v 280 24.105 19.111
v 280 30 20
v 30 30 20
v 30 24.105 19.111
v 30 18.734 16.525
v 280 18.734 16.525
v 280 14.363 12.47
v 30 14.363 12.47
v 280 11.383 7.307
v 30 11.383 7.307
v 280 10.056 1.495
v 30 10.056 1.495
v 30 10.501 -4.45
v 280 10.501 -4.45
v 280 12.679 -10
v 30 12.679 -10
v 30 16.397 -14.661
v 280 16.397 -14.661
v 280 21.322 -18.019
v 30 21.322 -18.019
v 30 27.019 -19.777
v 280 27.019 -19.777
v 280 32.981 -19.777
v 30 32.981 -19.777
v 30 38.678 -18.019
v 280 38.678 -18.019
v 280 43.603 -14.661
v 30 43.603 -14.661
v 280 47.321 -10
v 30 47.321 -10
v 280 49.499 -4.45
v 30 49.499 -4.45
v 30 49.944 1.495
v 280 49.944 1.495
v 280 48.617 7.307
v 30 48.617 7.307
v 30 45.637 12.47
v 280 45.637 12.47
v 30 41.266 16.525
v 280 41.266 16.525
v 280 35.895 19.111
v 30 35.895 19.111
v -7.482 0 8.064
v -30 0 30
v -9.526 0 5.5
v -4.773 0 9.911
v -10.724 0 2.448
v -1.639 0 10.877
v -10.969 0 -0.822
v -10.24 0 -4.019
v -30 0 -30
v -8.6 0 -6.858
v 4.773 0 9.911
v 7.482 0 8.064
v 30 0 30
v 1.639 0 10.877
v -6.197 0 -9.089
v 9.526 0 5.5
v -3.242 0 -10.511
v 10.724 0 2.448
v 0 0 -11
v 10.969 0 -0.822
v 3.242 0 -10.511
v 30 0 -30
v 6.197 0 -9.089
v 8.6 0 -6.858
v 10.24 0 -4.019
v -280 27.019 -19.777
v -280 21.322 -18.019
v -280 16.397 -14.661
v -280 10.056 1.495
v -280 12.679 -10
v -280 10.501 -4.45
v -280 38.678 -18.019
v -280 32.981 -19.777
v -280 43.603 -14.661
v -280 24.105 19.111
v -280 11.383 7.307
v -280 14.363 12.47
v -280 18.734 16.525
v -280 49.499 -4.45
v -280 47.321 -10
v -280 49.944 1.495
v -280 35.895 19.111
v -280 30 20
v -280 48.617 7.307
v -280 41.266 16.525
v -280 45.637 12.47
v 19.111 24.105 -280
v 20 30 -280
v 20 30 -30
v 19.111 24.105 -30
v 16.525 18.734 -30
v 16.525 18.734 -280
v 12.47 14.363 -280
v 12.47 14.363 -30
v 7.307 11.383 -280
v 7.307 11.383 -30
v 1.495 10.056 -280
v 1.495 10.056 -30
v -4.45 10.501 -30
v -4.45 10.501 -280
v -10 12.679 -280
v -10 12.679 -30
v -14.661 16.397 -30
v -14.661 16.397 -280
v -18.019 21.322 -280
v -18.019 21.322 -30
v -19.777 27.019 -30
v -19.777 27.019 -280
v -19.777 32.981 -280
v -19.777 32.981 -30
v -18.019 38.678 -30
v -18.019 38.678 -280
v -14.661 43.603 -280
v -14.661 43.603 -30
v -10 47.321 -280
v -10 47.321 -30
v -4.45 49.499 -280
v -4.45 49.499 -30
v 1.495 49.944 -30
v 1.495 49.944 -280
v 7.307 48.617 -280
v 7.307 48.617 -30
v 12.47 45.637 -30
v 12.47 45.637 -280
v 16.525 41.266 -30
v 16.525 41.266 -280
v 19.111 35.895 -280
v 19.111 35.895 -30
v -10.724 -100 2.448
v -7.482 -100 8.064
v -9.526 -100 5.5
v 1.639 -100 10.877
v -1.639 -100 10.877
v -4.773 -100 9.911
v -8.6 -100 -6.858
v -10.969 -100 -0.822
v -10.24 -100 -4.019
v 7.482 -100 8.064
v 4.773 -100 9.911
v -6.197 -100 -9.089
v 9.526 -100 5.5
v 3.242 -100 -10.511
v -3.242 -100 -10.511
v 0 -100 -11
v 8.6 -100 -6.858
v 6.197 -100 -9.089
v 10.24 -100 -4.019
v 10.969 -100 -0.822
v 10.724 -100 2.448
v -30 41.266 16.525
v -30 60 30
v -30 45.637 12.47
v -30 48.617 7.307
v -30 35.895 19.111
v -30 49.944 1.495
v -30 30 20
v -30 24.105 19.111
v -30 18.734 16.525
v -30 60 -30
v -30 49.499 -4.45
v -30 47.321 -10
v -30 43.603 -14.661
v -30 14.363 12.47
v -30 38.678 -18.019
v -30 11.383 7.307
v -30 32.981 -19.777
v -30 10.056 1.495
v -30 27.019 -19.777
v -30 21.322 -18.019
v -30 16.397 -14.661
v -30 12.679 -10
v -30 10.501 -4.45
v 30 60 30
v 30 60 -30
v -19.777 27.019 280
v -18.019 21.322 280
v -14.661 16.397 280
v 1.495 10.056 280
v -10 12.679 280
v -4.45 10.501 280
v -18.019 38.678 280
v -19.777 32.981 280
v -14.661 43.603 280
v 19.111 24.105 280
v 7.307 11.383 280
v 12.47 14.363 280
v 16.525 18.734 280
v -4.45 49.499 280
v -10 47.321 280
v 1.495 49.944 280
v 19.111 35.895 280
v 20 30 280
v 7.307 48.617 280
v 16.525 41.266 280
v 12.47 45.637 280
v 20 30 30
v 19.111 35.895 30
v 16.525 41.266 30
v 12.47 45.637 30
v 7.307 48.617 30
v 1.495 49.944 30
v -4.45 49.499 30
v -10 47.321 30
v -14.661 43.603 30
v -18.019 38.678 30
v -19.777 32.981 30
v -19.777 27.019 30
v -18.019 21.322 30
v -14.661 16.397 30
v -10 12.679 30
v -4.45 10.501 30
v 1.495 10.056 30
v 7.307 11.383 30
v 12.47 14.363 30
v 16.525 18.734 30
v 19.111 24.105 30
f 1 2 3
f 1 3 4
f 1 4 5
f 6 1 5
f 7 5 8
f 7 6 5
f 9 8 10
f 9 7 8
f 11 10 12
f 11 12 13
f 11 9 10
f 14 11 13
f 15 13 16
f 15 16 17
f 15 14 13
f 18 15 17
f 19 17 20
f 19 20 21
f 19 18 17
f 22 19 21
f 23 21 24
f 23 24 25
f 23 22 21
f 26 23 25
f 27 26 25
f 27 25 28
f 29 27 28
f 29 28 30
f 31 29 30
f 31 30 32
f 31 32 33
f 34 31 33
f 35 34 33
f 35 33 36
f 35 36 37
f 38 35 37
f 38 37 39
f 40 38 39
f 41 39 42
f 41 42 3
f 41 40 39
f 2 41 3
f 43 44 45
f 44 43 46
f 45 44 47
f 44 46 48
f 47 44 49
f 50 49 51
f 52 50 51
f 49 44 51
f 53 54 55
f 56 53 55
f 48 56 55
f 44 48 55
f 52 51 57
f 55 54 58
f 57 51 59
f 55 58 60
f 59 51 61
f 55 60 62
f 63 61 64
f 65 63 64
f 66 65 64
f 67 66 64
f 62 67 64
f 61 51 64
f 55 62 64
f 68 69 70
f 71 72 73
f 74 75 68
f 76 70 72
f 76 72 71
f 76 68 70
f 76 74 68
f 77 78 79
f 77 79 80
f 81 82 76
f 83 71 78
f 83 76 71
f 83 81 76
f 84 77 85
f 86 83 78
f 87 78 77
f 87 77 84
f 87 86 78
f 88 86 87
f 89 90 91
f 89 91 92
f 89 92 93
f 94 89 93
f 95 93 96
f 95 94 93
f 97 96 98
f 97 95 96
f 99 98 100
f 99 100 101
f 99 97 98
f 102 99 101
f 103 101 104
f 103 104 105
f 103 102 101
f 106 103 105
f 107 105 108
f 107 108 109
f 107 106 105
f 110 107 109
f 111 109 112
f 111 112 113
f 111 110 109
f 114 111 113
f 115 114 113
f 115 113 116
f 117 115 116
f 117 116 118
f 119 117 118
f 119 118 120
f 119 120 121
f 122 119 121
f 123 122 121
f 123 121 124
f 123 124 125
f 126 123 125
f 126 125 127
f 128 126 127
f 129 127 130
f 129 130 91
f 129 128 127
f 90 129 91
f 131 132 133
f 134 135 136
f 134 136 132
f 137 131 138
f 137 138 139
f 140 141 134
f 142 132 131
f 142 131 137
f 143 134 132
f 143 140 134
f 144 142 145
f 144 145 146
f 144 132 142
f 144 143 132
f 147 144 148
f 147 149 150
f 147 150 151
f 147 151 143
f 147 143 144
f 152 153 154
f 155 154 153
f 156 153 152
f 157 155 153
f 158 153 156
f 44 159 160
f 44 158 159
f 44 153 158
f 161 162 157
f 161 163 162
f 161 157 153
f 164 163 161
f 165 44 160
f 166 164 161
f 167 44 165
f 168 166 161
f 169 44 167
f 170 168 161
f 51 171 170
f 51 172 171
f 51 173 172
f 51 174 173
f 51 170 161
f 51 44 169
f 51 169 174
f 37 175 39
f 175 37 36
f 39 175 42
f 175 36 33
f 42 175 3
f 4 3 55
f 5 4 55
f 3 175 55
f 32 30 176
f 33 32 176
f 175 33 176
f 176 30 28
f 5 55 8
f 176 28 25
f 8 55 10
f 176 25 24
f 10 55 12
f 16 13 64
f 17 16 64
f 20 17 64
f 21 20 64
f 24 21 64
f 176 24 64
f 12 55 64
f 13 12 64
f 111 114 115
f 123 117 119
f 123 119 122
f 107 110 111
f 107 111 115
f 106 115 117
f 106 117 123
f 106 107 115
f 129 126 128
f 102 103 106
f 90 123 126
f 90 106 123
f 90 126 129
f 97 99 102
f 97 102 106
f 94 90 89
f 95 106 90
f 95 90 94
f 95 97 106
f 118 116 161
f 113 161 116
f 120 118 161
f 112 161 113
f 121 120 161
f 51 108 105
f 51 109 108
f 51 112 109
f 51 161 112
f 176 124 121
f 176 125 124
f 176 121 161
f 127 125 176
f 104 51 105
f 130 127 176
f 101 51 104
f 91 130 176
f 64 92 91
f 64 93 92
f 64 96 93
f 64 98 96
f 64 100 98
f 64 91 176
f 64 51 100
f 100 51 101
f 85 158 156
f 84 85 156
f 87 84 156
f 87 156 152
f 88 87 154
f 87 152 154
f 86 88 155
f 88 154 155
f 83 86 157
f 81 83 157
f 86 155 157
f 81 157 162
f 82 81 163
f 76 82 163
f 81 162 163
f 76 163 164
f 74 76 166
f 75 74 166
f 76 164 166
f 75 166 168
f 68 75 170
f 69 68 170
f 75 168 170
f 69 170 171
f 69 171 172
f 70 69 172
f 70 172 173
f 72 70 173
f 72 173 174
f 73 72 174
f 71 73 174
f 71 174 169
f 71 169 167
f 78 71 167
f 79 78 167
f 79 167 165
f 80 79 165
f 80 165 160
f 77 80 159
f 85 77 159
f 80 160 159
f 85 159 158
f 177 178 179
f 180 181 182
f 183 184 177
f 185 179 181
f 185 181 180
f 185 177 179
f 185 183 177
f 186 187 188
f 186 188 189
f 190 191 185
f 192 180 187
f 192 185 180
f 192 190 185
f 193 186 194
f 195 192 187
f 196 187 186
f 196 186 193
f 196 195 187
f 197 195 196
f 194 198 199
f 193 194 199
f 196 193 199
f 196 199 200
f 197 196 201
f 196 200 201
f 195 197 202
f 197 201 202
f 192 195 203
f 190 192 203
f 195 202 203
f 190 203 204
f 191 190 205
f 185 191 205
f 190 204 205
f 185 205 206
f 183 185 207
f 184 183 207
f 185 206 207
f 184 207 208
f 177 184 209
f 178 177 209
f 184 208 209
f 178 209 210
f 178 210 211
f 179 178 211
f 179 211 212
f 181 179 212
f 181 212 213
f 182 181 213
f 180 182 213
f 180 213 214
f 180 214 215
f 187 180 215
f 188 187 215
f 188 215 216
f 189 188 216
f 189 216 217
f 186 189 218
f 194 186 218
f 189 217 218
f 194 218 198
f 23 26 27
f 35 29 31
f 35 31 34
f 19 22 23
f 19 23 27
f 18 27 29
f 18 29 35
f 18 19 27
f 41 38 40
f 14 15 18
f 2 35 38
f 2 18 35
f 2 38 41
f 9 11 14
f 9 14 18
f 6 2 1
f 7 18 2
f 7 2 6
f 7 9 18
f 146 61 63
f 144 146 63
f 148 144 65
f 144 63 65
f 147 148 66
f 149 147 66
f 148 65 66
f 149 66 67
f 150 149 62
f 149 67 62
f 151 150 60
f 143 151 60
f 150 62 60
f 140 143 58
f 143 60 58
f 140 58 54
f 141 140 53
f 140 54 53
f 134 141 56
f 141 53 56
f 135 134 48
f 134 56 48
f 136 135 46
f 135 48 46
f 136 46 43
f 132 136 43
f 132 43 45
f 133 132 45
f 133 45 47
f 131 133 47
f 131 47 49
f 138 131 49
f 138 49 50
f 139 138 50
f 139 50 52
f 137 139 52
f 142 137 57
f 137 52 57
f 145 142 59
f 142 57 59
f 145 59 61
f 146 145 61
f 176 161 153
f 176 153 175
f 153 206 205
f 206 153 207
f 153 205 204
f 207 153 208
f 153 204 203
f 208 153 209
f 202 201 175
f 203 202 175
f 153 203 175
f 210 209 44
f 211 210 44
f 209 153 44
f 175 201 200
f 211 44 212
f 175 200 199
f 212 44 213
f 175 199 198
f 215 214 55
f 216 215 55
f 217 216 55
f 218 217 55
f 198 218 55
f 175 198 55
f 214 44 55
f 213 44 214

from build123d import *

# Parameters (mm, degrees)
SKETCH1_W           = 60
SKETCH1_H           = 60
BOSS_EXTRUDE1_DEPTH = 60
SKETCH2_R           = 20
BOSS_EXTRUDE2_DEPTH = 250
SKETCH3_R           = 20
BOSS_EXTRUDE3_DEPTH = 250
BOSS_EXTRUDE4_START = 250
SKETCH4_R           = 20
BOSS_EXTRUDE4_DEPTH = 250
BOSS_EXTRUDE5_START = 250
SKETCH5_R           = 20
BOSS_EXTRUDE5_DEPTH = 250
SKETCH6_R           = 11
BOSS_EXTRUDE6_DEPTH = 100


with BuildPart() as part:
    # Sketch1 → Boss-Extrude1 (new body)
    with BuildSketch(Plane(origin=(0, 0, 0), x_dir=(1, 0, 0), z_dir=(0, 1, 0))):
        Rectangle(SKETCH1_W, SKETCH1_H)
    extrude(amount=BOSS_EXTRUDE1_DEPTH)

    # Sketch2 → Boss-Extrude2 (add)
    with BuildSketch(Plane.XY.offset(30)):
        with Locations((0, 30)):
            Circle(SKETCH2_R)
    extrude(amount=BOSS_EXTRUDE2_DEPTH)

    # Sketch3 → Boss-Extrude3 (add)
    with BuildSketch(Plane.ZY.offset(30)):
        with Locations((0, 30)):
            Circle(SKETCH3_R)
    extrude(amount=BOSS_EXTRUDE3_DEPTH)

    # Sketch4 → Boss-Extrude4 (add)
    with BuildSketch(Plane(origin=(0, 0, -30), x_dir=(-1, 0, 0), z_dir=(0, 0, -1)).offset(BOSS_EXTRUDE4_START)):
        with Locations(Location((0, 30, 0), (0, 0, 180))):
            Circle(SKETCH4_R)
    extrude(amount=-BOSS_EXTRUDE4_DEPTH)

    # Sketch5 → Boss-Extrude5 (add)
    with BuildSketch(Plane(origin=(30, 0, 0), x_dir=(0, 0, -1), z_dir=(1, 0, 0)).offset(BOSS_EXTRUDE5_START)):
        with Locations(Location((0, 30, 0), (0, 0, 180))):
            Circle(SKETCH5_R)
    extrude(amount=-BOSS_EXTRUDE5_DEPTH)

    # Sketch6 → Boss-Extrude6 (add)
    with BuildSketch(Plane.XZ):
        with Locations(Location((0, 0, 0), (0, 0, 270))):
            Circle(SKETCH6_R)
    extrude(amount=BOSS_EXTRUDE6_DEPTH)


solid = part.part
